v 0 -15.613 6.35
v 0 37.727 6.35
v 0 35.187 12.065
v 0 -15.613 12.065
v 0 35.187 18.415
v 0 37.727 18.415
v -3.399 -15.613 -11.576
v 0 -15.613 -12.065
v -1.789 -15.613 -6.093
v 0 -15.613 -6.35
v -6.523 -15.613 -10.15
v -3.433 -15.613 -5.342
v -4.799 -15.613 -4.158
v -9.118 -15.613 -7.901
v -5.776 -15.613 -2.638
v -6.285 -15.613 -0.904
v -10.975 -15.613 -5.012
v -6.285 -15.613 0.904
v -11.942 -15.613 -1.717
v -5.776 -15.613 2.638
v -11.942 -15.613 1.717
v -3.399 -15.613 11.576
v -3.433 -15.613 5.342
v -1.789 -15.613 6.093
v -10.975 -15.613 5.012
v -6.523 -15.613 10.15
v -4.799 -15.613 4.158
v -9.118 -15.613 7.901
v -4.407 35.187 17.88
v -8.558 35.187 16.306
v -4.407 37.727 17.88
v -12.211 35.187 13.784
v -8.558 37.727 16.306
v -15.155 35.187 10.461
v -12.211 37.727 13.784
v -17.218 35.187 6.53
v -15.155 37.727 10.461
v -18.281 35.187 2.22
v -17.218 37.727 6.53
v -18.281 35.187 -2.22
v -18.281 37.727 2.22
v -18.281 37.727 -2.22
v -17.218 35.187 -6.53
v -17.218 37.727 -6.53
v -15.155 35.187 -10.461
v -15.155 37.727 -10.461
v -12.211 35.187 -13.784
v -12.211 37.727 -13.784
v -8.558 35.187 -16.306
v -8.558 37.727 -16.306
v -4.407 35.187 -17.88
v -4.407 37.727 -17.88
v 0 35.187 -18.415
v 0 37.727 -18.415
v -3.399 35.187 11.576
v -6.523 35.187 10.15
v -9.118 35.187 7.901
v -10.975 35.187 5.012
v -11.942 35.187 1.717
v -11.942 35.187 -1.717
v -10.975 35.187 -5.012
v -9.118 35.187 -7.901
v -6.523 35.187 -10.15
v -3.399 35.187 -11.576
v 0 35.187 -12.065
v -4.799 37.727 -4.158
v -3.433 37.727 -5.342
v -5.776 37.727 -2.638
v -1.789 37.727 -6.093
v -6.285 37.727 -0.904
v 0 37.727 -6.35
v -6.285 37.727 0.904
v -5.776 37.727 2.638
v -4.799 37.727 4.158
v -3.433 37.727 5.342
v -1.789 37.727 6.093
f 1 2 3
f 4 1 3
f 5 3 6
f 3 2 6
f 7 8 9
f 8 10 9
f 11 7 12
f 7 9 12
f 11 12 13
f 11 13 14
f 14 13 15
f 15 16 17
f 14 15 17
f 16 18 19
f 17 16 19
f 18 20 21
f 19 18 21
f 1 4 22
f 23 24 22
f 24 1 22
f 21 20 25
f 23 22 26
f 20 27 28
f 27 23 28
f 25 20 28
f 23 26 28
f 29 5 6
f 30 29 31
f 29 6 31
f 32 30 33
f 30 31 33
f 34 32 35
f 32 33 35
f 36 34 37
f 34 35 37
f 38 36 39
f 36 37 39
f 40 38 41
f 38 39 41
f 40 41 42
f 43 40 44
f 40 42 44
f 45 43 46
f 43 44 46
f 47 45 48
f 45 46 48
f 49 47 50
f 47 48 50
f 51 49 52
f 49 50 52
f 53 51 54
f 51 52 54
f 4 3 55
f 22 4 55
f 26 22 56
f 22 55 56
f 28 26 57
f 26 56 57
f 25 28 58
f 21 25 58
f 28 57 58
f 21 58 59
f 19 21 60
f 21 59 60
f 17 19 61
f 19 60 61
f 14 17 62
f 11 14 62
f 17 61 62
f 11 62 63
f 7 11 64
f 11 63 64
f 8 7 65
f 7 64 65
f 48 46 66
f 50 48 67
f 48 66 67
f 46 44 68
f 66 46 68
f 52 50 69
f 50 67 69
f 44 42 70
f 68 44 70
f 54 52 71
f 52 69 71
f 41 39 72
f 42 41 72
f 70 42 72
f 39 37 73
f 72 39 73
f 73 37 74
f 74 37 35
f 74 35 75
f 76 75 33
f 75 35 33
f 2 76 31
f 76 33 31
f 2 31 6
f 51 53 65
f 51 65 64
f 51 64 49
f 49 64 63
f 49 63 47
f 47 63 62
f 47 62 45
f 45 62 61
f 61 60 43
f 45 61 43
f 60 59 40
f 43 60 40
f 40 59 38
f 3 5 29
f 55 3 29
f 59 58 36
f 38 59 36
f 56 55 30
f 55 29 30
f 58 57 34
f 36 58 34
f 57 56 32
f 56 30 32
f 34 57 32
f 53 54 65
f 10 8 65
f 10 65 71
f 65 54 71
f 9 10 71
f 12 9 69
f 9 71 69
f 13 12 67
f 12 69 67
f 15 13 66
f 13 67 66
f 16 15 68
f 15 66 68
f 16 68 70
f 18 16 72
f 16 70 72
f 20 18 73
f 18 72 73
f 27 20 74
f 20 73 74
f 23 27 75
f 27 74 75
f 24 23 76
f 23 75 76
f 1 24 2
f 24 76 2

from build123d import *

# Parameters (mm, degrees)
F2_R     = 6.35
F3_DEPTH = 101.6
F5_DEPTH = 127


with BuildPart() as f1:
    # F0 (on Top) → F1 (revolve)
    with BuildSketch(Plane.XY):
        Polygon((0, 37.726658), (0, -15.613342), (12.065, -15.613342), (12.065, 35.186658), (18.415, 35.186658), (18.415, 37.726658), align=None)
    revolve(axis=Axis((0, 11.056658, 0), (0, -1, 0)))

    # F2 (on face) → F3 (cut)
    with BuildSketch(Plane(origin=(0, 37.726658, 0), x_dir=(-1, 0, 0), z_dir=(0, 1, 0))):
        Circle(F2_R)
    extrude(amount=-F3_DEPTH, mode=Mode.SUBTRACT)

    # F4 (on face) → F5 (cut)
    with BuildSketch(Plane(origin=(0, 37.726658, 0), x_dir=(-1, 0, 0), z_dir=(0, 1, 0))):
        Polygon((0, 18.415), (0, 18.85934), (0, 32.270402), (-18.049083, 25.601261), (-23.923116, -16.779846), (0, -20.095596), align=None)
    extrude(amount=-F5_DEPTH, mode=Mode.SUBTRACT)


solid = f1.part
